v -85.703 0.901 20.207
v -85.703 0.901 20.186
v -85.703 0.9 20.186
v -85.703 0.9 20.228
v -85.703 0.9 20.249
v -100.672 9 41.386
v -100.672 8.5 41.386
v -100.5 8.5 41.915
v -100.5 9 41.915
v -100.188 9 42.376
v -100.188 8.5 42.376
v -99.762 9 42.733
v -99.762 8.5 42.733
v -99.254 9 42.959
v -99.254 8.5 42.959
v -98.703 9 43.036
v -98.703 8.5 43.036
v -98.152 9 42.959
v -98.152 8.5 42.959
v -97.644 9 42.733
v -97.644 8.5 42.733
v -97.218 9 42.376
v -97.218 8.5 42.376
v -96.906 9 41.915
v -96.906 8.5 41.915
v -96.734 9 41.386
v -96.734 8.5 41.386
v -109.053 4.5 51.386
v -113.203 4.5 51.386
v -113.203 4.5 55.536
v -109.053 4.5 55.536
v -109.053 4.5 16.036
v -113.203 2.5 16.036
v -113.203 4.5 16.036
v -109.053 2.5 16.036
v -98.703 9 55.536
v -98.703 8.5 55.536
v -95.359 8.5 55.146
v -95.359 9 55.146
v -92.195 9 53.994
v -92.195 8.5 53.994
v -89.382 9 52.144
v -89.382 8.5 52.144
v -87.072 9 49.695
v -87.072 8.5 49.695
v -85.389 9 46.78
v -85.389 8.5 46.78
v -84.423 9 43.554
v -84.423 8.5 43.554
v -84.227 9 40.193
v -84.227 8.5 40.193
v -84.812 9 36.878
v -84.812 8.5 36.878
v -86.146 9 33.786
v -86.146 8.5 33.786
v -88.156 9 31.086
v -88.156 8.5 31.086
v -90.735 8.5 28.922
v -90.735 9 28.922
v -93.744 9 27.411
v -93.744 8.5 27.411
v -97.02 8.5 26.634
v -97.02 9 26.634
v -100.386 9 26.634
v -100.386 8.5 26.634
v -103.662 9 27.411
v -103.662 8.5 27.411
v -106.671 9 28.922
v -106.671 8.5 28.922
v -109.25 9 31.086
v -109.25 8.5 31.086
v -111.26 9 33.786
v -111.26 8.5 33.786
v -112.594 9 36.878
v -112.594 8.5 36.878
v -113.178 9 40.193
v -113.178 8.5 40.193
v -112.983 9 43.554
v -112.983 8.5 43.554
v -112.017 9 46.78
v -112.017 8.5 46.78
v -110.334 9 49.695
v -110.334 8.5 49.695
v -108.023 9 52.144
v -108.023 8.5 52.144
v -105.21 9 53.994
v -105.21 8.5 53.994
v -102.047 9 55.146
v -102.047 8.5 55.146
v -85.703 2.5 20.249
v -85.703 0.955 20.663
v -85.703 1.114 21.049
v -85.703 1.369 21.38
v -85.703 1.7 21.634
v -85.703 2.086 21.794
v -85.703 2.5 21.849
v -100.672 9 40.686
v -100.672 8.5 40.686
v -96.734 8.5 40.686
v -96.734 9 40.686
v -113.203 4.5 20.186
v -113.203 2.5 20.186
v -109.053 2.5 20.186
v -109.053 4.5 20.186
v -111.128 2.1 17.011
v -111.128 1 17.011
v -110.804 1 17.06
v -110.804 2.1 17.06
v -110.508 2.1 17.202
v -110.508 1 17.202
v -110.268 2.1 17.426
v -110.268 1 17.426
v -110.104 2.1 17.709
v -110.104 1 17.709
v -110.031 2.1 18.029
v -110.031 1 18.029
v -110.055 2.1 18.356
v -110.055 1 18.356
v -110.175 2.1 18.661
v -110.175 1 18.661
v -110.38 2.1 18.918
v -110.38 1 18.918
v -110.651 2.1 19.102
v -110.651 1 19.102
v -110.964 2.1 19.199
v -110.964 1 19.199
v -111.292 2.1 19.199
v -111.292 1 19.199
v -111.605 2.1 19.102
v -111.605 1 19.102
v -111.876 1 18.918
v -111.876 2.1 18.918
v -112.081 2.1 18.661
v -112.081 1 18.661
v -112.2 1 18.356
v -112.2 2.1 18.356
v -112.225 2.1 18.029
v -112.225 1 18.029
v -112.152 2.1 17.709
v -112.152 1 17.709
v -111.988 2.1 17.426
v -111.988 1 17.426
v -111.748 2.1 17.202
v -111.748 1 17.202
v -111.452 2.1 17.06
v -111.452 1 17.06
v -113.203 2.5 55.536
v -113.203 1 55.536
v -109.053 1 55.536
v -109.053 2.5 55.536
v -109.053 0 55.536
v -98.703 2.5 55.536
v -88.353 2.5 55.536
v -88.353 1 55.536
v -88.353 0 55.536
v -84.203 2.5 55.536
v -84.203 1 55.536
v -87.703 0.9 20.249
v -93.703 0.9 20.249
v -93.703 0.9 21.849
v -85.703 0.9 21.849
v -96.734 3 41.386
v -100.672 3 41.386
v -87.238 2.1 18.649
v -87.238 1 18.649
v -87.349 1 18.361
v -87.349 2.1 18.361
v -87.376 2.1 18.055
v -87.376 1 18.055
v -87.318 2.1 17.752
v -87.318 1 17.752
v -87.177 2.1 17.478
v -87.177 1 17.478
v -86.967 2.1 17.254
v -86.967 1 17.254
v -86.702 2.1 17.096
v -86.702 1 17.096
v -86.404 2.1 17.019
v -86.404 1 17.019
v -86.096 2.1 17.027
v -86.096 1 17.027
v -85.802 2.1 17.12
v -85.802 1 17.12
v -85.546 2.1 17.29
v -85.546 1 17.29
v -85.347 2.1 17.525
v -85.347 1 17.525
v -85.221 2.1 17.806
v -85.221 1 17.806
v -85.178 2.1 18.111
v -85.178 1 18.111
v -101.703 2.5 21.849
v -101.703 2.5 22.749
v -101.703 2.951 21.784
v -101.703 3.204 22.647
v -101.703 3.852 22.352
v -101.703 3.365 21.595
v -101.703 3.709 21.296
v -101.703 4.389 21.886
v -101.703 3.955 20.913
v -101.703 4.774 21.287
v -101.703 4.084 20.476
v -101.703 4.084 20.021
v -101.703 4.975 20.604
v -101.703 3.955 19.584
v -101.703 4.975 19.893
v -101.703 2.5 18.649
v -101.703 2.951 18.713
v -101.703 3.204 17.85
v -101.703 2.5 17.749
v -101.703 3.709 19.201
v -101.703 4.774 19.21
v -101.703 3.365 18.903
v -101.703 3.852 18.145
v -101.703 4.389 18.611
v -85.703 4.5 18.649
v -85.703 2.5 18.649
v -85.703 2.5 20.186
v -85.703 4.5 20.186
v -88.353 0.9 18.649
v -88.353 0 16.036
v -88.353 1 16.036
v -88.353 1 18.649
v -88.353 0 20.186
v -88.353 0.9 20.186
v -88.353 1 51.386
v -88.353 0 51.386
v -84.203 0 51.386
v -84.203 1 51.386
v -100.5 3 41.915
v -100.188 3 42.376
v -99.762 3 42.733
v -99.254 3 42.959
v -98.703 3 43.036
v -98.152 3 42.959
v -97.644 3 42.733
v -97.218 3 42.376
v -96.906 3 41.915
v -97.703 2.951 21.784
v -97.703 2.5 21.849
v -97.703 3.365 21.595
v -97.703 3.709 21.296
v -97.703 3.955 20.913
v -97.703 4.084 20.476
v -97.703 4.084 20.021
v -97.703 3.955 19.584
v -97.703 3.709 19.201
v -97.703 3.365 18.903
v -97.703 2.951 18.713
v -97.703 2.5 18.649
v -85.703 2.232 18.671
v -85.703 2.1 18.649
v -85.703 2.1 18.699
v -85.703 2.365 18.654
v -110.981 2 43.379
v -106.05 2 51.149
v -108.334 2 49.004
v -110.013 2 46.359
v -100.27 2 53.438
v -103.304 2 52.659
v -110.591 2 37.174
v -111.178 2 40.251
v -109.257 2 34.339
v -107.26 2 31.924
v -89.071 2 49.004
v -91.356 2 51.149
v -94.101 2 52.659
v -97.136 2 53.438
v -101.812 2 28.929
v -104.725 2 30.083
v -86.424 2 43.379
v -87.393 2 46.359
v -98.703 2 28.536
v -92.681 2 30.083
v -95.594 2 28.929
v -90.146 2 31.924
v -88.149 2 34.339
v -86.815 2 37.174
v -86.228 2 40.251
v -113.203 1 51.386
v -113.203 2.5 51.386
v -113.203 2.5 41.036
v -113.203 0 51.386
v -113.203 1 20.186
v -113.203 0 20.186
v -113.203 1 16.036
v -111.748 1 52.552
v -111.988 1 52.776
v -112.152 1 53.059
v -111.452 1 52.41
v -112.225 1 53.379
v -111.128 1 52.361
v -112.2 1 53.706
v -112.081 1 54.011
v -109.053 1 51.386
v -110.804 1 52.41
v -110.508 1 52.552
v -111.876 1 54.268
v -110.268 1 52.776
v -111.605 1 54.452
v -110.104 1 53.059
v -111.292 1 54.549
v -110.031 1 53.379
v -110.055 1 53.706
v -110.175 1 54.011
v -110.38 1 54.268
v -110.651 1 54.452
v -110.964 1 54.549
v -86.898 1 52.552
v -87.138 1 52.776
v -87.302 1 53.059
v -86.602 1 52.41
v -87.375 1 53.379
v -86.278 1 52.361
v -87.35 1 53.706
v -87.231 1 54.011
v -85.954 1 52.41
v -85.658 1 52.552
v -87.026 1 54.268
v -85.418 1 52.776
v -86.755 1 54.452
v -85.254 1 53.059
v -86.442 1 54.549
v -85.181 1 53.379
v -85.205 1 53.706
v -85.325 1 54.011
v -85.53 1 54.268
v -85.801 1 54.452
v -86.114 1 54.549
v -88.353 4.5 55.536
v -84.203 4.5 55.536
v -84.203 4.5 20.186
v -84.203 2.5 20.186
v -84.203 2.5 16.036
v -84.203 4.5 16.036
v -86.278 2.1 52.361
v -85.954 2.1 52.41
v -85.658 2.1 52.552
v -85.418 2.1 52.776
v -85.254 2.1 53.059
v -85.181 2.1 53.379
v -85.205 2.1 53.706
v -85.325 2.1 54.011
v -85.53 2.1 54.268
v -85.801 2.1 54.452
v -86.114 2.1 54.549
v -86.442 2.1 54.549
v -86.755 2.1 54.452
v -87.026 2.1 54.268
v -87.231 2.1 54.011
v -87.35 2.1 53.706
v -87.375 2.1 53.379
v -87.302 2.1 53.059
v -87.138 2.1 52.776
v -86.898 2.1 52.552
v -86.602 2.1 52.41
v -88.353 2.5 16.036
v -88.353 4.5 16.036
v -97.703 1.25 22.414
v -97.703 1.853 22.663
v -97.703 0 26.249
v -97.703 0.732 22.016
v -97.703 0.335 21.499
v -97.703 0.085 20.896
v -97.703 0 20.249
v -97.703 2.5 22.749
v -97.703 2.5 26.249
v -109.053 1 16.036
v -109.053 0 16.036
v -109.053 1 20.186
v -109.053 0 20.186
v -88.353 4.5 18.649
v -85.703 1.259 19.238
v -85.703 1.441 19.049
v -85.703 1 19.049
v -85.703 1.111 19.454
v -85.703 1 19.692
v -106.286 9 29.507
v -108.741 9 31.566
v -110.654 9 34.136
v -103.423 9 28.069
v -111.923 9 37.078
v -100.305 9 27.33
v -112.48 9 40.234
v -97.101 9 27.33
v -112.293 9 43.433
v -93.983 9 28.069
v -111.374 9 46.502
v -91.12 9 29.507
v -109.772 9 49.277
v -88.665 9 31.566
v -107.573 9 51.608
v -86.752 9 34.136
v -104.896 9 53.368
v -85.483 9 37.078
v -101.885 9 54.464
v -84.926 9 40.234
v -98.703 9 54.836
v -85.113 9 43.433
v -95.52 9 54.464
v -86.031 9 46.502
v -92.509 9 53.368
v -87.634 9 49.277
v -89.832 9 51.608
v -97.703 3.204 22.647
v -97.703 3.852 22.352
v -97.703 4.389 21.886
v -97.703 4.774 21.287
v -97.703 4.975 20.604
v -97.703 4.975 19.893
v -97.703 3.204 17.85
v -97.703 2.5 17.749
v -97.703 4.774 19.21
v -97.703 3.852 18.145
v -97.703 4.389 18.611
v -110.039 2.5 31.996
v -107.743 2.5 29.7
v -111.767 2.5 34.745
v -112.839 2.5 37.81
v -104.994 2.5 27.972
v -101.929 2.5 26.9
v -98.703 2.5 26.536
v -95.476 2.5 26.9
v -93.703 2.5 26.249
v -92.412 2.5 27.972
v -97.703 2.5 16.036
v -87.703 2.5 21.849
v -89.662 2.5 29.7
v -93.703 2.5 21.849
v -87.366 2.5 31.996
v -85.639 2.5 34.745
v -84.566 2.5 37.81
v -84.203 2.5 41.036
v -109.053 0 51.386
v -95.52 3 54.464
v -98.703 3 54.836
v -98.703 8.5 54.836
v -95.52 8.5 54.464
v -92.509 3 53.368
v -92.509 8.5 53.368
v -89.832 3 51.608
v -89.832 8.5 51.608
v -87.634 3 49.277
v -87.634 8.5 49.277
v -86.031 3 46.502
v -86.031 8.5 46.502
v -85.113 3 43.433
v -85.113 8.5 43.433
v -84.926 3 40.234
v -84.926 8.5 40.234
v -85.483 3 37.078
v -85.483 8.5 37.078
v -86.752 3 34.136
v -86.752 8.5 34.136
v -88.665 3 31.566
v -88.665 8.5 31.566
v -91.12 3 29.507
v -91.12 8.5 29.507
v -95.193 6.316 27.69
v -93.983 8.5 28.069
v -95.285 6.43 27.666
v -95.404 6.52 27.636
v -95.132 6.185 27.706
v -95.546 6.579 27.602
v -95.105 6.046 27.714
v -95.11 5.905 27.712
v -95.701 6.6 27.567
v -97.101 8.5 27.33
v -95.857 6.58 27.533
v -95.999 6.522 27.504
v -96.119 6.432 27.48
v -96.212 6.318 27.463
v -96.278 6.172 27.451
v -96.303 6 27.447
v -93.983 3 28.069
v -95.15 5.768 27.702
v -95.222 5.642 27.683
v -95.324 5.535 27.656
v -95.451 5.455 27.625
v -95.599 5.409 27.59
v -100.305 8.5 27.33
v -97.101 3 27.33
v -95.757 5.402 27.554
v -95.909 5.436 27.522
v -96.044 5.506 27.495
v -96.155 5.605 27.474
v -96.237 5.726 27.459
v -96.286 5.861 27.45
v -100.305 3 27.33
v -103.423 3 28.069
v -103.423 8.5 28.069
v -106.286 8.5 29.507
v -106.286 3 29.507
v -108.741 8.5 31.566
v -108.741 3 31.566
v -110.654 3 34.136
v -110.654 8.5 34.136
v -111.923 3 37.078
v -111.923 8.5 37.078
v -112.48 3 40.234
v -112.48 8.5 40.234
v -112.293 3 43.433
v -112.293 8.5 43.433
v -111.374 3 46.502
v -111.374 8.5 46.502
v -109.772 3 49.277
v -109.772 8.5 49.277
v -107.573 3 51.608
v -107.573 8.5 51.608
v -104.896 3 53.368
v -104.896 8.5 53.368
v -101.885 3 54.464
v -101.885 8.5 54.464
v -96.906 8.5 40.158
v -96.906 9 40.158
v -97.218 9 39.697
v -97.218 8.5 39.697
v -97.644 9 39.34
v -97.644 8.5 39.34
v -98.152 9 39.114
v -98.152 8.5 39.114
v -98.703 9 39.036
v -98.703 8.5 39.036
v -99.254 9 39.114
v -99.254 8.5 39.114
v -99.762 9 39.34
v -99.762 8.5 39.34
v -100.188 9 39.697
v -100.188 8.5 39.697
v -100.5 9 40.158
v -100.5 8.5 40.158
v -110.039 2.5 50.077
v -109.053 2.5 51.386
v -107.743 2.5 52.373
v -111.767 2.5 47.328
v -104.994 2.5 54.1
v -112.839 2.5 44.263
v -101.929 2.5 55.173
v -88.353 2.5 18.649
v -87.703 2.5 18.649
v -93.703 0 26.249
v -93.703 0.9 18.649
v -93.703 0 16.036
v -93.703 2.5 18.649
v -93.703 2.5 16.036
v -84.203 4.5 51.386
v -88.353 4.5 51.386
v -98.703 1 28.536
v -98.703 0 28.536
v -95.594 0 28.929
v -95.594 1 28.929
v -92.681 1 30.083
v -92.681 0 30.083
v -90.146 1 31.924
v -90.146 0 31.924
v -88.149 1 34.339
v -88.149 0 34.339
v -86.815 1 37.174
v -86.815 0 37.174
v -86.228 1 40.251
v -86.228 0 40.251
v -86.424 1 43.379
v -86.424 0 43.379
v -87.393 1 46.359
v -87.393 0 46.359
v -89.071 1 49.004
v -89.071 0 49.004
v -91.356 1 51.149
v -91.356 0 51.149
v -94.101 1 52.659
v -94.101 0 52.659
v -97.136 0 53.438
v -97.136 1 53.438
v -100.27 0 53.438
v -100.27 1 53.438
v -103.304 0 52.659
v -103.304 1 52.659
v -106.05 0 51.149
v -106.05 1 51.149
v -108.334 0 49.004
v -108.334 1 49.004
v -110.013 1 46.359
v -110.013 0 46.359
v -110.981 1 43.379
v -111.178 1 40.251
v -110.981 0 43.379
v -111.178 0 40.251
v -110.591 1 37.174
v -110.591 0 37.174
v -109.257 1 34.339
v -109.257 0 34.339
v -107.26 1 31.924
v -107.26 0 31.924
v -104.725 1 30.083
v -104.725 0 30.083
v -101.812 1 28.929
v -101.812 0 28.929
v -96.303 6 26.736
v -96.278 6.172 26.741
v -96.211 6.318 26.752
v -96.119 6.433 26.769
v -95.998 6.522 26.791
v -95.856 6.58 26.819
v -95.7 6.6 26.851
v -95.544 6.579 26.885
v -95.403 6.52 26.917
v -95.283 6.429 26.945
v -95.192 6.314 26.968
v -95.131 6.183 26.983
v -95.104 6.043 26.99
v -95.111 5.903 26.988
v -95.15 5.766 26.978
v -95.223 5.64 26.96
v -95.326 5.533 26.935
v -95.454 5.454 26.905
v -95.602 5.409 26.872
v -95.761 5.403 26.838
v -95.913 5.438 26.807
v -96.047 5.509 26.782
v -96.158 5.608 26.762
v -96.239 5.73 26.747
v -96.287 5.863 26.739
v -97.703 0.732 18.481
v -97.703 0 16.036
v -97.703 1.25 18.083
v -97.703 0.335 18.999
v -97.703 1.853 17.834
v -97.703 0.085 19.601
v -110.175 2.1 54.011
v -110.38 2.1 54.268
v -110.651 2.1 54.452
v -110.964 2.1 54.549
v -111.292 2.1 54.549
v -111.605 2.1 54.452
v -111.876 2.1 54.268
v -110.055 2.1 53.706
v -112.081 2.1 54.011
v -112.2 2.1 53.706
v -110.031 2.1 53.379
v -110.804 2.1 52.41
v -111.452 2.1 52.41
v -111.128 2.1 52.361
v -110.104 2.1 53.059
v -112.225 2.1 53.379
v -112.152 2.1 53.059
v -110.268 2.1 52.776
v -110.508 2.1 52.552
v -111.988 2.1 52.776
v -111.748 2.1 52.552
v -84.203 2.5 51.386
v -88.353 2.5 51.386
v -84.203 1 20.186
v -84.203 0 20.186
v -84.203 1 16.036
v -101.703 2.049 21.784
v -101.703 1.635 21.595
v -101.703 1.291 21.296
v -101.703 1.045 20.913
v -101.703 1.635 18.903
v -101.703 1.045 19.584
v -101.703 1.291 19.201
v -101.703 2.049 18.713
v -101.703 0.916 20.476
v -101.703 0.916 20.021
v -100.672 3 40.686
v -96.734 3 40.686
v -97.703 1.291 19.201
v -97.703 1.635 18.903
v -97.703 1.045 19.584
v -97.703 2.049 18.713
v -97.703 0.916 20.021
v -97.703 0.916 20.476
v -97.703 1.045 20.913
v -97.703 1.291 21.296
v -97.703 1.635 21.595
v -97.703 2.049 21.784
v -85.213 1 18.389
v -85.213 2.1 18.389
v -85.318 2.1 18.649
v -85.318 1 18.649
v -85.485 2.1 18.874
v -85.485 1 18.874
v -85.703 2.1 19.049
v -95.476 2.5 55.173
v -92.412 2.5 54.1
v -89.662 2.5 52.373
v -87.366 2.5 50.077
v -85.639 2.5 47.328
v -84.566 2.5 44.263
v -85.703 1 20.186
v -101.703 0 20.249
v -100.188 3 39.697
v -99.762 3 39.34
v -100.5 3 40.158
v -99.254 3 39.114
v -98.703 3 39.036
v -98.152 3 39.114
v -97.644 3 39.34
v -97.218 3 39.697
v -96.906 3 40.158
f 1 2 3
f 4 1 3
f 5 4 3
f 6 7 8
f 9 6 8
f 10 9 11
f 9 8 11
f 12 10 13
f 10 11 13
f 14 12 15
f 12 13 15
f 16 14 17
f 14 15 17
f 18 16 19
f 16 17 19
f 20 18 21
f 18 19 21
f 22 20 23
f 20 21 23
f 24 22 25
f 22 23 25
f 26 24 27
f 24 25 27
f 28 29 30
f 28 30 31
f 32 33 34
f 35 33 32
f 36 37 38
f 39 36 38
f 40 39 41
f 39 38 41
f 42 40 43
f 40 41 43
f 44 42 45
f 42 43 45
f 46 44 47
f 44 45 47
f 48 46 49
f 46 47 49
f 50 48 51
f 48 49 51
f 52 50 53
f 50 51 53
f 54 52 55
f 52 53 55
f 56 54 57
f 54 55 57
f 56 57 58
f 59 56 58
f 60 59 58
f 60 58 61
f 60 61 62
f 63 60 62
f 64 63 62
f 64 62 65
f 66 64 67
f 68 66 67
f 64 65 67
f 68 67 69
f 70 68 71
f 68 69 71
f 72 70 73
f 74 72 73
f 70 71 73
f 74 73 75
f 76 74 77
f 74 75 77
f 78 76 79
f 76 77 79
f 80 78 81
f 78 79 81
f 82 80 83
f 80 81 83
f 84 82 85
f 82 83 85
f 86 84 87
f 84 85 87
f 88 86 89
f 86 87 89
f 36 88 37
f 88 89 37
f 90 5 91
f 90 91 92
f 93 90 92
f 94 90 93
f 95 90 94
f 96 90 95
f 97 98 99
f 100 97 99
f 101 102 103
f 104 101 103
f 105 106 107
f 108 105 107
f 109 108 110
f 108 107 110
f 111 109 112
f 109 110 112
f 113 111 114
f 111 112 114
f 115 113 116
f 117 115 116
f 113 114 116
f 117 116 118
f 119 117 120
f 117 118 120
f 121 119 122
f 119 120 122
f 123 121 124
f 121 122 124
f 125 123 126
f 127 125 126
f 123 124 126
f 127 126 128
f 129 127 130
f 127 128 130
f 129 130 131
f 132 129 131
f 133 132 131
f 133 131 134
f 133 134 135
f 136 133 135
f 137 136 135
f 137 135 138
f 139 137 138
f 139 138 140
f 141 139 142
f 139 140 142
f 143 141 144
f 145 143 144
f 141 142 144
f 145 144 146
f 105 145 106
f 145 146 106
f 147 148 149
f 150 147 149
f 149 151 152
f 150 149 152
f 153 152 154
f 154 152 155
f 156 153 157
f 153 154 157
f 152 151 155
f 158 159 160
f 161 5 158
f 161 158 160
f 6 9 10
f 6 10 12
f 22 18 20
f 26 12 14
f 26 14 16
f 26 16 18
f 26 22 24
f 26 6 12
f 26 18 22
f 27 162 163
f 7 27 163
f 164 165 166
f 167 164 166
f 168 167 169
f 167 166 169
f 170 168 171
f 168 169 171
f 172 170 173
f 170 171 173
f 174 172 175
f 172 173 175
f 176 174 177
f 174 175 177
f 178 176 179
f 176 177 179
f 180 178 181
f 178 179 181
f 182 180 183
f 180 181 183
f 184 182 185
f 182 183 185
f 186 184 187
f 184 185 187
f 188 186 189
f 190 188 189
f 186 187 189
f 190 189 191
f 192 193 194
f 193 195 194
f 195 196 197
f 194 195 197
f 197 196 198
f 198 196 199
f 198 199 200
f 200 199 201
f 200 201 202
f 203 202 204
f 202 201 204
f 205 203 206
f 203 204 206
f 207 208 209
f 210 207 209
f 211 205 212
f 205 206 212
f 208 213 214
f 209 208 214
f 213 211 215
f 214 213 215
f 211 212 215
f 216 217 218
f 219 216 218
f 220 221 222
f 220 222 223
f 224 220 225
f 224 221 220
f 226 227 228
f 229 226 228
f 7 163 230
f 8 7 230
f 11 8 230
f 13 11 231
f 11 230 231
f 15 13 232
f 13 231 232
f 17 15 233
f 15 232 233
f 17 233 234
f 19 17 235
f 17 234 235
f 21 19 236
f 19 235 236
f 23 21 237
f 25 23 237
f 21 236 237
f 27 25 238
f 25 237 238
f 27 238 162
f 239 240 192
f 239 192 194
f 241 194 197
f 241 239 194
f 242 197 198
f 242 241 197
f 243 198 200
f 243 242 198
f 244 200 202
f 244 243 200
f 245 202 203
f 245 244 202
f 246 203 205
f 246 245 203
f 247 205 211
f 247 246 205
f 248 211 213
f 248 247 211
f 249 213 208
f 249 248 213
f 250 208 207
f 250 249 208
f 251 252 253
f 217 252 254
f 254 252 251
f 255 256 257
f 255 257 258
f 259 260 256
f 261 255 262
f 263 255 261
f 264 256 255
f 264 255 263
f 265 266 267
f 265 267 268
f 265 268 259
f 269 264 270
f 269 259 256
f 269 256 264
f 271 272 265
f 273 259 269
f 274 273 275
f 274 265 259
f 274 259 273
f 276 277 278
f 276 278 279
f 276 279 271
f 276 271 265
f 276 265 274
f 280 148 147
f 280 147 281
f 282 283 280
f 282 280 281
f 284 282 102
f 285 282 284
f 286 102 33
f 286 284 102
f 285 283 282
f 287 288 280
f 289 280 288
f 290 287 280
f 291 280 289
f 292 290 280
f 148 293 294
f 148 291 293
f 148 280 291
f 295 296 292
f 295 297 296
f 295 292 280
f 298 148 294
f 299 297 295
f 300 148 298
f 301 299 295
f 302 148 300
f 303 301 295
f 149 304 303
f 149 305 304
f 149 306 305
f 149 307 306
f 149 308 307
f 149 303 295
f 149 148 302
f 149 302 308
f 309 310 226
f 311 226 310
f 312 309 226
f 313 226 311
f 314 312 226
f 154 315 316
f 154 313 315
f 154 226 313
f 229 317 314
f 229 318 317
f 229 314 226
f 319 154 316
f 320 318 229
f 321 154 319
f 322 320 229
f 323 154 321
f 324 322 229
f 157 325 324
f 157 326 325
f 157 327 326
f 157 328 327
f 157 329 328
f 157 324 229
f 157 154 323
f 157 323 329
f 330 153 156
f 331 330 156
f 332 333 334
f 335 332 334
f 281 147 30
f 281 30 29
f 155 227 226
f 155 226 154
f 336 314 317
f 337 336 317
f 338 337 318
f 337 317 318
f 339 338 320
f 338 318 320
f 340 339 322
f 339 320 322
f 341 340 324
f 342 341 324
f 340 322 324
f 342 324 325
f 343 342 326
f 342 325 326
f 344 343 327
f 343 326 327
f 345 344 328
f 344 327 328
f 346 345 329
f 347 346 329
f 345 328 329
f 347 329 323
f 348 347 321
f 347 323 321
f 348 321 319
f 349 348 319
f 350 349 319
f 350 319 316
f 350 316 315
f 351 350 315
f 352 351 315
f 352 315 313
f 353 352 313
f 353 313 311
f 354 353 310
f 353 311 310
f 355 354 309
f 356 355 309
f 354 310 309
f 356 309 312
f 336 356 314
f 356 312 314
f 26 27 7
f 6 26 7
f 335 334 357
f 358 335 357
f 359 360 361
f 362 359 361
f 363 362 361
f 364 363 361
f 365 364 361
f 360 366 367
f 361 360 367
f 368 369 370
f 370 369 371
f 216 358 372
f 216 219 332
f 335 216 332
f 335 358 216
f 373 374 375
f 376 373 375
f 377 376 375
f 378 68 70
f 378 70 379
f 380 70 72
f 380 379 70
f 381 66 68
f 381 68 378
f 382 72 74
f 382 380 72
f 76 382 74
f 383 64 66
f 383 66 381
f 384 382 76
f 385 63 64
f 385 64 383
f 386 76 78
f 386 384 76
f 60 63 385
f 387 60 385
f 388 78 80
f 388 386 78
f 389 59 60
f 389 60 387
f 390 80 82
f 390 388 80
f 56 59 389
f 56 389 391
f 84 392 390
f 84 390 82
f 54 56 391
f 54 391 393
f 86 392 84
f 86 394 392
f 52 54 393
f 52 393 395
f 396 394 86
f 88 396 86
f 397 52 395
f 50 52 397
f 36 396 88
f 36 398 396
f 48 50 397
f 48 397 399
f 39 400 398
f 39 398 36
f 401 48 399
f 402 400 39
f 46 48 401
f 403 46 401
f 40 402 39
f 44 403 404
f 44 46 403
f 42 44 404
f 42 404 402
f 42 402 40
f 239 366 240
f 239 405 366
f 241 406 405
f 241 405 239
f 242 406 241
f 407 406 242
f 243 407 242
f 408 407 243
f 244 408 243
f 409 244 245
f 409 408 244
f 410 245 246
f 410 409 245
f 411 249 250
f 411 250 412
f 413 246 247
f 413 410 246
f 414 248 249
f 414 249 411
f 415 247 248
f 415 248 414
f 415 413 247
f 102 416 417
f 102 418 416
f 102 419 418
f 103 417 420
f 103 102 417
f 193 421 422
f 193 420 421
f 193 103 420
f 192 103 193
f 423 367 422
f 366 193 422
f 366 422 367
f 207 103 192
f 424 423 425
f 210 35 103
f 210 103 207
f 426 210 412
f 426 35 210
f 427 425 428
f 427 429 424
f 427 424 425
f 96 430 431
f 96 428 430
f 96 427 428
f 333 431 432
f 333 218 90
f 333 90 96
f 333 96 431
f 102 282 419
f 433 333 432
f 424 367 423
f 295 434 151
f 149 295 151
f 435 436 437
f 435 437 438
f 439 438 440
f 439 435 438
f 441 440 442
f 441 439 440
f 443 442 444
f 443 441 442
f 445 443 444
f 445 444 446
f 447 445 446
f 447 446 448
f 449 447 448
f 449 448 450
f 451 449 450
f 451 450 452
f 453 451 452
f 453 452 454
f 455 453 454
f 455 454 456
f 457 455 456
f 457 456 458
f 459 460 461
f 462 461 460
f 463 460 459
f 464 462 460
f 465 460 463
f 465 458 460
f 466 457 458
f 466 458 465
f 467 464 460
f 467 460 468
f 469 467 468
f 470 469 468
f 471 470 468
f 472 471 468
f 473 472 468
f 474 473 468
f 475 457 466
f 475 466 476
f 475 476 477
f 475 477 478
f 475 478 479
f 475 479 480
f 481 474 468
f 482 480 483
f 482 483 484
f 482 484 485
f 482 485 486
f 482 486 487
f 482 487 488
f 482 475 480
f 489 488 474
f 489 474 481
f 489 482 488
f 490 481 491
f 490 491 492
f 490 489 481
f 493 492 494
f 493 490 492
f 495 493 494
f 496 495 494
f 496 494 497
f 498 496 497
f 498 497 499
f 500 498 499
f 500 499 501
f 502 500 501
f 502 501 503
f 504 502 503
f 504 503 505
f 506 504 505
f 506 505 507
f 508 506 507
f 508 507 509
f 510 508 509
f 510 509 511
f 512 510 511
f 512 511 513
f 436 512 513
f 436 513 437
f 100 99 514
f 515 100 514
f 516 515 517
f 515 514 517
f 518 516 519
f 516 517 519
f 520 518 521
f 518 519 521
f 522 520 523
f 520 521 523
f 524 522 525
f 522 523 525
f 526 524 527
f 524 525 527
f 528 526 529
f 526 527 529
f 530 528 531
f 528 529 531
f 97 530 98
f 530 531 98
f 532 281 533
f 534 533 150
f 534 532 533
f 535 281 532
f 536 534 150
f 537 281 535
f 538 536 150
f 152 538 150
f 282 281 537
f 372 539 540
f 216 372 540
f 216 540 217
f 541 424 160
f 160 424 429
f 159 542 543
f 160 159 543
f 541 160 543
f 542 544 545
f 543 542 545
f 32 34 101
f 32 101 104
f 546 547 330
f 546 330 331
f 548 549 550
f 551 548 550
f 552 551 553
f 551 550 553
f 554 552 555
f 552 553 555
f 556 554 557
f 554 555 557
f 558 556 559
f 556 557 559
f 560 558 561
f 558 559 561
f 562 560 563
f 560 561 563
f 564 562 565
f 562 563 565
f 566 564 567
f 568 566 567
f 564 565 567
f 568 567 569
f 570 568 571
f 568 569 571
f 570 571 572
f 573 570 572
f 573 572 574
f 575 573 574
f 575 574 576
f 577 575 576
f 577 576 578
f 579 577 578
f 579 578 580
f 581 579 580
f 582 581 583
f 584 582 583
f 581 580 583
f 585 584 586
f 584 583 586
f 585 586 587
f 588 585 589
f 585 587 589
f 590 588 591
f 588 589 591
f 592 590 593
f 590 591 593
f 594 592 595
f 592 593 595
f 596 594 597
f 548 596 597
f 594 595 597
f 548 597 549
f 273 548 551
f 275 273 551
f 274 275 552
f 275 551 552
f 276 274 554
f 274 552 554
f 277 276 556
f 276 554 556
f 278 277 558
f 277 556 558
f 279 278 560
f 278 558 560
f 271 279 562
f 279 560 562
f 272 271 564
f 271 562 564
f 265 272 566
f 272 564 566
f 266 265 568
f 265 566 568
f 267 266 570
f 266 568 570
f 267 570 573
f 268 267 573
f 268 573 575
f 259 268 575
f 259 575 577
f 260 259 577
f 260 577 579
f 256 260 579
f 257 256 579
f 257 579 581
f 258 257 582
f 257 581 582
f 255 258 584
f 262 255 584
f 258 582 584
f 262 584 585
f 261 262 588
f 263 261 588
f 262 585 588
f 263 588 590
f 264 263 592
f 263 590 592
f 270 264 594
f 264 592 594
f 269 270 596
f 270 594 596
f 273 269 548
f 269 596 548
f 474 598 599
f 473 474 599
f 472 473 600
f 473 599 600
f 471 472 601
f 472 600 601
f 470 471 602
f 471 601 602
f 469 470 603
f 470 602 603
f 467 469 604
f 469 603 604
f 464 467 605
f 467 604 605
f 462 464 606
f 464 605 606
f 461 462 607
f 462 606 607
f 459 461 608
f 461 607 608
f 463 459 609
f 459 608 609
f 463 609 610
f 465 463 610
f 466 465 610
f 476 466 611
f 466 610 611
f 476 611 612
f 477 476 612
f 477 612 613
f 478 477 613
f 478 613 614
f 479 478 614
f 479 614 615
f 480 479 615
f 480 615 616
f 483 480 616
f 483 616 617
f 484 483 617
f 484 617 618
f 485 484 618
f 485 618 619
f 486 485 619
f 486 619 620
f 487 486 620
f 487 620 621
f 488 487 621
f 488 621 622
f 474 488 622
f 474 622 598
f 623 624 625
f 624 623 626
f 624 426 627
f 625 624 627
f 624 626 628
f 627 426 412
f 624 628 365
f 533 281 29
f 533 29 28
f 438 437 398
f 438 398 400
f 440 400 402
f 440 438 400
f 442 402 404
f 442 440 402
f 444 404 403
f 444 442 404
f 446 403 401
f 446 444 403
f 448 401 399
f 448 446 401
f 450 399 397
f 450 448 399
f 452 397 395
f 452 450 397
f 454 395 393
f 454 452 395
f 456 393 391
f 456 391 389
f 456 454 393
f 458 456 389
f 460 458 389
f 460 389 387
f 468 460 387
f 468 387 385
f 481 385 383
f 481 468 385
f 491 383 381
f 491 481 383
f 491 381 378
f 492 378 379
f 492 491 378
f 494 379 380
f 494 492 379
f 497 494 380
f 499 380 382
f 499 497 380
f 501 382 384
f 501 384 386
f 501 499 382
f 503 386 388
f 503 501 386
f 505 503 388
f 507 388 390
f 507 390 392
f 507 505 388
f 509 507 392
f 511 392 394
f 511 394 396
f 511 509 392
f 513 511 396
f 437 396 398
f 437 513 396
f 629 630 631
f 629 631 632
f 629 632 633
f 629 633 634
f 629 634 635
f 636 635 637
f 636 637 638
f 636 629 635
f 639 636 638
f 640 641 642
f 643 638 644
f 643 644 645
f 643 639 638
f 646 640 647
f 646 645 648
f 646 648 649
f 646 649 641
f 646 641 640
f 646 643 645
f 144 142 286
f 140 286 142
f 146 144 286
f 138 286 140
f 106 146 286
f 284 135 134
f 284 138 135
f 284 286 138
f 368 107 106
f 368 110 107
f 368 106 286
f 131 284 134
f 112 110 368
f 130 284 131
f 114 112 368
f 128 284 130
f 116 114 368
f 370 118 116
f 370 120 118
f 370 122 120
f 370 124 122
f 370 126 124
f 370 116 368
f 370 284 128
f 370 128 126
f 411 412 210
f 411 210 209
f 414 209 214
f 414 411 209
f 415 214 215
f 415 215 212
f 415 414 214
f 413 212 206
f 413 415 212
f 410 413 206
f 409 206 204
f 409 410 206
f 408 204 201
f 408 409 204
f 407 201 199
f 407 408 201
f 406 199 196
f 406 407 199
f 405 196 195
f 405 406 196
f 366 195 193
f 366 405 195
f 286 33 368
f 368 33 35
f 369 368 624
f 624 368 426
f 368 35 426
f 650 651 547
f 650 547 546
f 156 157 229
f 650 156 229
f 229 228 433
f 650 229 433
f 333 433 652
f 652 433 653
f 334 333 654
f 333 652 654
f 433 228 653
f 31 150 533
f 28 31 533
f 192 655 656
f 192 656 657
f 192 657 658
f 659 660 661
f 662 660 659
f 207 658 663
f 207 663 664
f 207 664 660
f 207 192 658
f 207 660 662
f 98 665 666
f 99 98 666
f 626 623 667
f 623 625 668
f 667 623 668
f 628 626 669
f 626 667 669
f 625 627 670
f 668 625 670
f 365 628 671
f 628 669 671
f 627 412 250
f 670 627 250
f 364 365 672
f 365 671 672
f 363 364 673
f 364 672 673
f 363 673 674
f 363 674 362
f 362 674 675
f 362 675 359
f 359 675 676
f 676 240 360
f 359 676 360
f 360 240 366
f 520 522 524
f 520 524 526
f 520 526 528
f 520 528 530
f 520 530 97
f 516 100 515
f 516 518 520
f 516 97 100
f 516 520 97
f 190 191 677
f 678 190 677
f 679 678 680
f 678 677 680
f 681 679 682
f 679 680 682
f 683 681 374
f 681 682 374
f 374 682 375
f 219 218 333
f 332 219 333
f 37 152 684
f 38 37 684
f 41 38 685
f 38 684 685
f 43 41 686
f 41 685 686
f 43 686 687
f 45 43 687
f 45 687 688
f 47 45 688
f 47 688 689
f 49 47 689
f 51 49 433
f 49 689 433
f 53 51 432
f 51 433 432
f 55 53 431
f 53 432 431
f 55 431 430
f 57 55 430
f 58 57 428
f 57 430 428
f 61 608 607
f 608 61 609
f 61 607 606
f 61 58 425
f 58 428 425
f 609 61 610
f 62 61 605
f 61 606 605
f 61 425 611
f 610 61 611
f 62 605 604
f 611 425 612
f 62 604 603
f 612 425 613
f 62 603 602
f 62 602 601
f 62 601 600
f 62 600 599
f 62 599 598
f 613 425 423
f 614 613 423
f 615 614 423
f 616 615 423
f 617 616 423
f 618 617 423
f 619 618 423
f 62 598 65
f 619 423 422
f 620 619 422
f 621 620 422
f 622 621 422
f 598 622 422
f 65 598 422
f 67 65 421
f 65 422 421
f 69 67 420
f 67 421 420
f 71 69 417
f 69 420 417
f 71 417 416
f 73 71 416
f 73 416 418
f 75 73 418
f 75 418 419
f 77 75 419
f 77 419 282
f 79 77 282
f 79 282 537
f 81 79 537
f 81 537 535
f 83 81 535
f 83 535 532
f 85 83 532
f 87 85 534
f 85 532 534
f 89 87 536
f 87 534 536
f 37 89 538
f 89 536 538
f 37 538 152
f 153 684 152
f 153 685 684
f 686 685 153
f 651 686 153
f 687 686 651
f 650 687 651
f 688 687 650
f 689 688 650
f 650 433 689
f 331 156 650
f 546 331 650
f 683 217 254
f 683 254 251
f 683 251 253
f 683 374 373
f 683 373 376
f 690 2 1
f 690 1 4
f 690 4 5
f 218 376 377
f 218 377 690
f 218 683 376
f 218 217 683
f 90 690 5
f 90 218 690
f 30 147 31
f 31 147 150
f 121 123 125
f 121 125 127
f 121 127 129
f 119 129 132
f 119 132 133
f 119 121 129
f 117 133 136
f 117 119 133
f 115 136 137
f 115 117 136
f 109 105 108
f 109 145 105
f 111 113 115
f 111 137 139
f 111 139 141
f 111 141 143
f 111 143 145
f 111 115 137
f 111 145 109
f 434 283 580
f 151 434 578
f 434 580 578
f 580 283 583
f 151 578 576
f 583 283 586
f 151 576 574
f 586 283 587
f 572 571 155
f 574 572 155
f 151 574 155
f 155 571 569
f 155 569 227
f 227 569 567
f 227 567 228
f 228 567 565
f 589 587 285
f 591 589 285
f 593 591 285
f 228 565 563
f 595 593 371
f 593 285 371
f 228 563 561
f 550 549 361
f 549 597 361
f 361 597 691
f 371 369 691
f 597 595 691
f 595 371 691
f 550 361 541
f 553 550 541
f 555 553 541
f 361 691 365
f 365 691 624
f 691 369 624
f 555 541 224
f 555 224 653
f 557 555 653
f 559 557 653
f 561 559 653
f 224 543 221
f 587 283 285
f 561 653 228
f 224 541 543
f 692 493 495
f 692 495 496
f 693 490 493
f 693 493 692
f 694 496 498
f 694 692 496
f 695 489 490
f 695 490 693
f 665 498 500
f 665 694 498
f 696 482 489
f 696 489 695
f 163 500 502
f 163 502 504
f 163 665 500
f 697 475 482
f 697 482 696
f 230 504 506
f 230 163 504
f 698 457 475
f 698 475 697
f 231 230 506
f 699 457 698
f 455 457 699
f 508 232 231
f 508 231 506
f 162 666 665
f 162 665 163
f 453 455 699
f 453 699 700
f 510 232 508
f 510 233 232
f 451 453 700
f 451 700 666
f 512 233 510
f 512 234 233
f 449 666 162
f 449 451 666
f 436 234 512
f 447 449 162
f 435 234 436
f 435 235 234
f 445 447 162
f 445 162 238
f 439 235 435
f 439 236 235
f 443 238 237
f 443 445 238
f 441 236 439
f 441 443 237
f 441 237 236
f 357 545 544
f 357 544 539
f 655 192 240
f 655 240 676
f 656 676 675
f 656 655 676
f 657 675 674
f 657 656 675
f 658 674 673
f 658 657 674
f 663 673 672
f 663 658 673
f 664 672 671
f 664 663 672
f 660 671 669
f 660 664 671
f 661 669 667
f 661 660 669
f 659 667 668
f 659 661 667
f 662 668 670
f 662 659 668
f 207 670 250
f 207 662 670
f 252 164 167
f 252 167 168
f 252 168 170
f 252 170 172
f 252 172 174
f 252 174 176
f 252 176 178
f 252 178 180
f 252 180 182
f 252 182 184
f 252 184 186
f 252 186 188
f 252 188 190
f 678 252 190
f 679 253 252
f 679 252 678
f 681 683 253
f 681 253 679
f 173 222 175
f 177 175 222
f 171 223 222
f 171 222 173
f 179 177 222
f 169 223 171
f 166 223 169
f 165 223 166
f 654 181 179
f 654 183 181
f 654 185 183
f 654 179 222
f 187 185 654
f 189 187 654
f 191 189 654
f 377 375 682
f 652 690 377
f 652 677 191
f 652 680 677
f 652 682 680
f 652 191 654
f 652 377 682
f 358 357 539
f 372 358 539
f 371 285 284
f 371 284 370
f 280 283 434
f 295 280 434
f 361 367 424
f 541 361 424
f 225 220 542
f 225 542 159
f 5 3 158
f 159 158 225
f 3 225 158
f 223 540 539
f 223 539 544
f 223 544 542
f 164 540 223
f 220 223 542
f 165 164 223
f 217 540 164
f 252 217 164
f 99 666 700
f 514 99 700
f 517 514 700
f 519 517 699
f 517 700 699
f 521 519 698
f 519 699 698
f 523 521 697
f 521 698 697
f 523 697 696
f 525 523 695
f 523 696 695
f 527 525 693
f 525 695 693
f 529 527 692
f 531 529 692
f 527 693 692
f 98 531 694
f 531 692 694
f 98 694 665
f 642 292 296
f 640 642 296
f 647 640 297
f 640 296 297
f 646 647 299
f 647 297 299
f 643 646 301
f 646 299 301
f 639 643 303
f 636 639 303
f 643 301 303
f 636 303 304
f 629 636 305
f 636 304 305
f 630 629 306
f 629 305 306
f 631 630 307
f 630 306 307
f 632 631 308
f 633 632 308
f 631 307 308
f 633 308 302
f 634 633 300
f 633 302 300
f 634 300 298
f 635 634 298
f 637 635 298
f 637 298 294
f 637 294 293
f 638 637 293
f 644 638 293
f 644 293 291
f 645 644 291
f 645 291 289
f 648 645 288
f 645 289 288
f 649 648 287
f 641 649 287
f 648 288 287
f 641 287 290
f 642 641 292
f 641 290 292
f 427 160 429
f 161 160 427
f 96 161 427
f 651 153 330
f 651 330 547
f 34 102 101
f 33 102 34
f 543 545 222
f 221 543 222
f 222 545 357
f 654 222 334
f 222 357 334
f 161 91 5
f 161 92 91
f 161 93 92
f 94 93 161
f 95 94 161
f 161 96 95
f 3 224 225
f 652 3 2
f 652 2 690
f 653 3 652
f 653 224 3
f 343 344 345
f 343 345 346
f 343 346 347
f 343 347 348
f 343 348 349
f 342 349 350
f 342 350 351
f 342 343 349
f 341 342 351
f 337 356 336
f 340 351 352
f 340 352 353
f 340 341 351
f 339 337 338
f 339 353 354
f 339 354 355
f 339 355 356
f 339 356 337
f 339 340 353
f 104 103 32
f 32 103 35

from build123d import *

# Parameters (mm, degrees)
SKETCH1_W               = 29
SKETCH1_H               = 50
BOSS_EXTRUDE1_DEPTH     = 2.5
BOSS_EXTRUDE3_DEPTH     = 6
BOSS_EXTRUDE4_DEPTH     = 6
CUT_EXTRUDE1_DEPTH      = 6
CUT_EXTRUDE2_DEPTH      = 6
CUT_EXTRUDE3_DEPTH      = 10
CUT_EXTRUDE3_DEPTH_BACK = 4
SKETCH6_R               = 1.6
SKETCH7_R               = 2.5
SKETCH7_R_2             = 1.6
BOSS_EXTRUDE6_DEPTH     = 4
SKETCH8_W               = 3.2
SKETCH8_H               = 1.6
CUT_EXTRUDE4_DEPTH      = 8
CUT_EXTRUDE5_DEPTH      = 5
SKETCH10_R              = 12.5
SKETCH10_W              = 4.15
SKETCH10_H              = 4.15
CUT_EXTRUDE7_DEPTH      = 1
SKETCH11_W              = 4.15
SKETCH11_H              = 4.15
BOSS_EXTRUDE7_DEPTH     = 2
SKETCH13_R              = 1.1
CUT_EXTRUDE8_DEPTH      = 1.1
SKETCH14_R              = 12.5
CUT_EXTRUDE9_DEPTH      = 1
SKETCH15_R              = 13.8
BOSS_EXTRUDE8_DEPTH     = 0.5
SKETCH16_R              = 14.5
SKETCH16_R_2            = 13.8
BOSS_EXTRUDE9_DEPTH     = 0.5


with BuildPart() as part:
    # Sketch1 → Boss-Extrude1 (new body)
    with BuildSketch(Plane(origin=(0, 0, 0), x_dir=(1, 0, 0), z_dir=(0, 1, 0))):
        with Locations((-98.70287726, -30.536357795)):
            Rectangle(SKETCH1_W, SKETCH1_H)
    extrude(amount=BOSS_EXTRUDE1_DEPTH)

    # Sketch2 → Boss-Extrude3 (add)
    with BuildSketch(Plane(origin=(0, 2.5, 0), x_dir=(1, 0, 0), z_dir=(0, 1, 0))):
        with BuildLine():
            ThreePointArc((-84.20287726, -41.036357795), (-108.955925587, -30.783309468), (-98.70287726, -55.536357795))
            ThreePointArc((-98.70287726, -55.536357795), (-88.449828932, -51.289406123), (-84.20287726, -41.036357795))
        make_face()
        with BuildLine():
            ThreePointArc((-84.90287726, -41.036357795), (-88.944803679, -50.794431376), (-98.70287726, -54.836357795))
            ThreePointArc((-98.70287726, -54.836357795), (-108.46095084, -31.278284215), (-84.90287726, -41.036357795))
        make_face(mode=Mode.SUBTRACT)
    extrude(amount=BOSS_EXTRUDE3_DEPTH)

    # Sketch3 → Boss-Extrude4 (add)
    with BuildSketch(Plane(origin=(0, 2.5, 0), x_dir=(1, 0, 0), z_dir=(0, 1, 0))):
        with BuildLine():
            Line((-100.672014126, -40.686357795), (-96.733740393, -40.686357795))
            ThreePointArc((-96.733740393, -40.686357795), (-98.70287726, -39.036357795), (-100.672014126, -40.686357795))
        make_face()
        with BuildLine():
            Line((-96.733740393, -41.386357795), (-100.672014126, -41.386357795))
            ThreePointArc((-100.672014126, -41.386357795), (-98.70287726, -43.036357795), (-96.733740393, -41.386357795))
        make_face()
    extrude(amount=BOSS_EXTRUDE4_DEPTH)

    # Sketch4 → Cut-Extrude1 (cut)
    with BuildSketch(Plane(origin=(0, 2.5, 0), x_dir=(1, 0, 0), z_dir=(0, 1, 0))):
        Polygon((-97.70287726, -14.248512358), (-97.70287726, -20.248512358), (-97.70287726, -26.248512358), (-93.70287726, -26.248512358), (-93.70287726, -14.248512358), align=None)
    extrude(amount=-CUT_EXTRUDE1_DEPTH, mode=Mode.SUBTRACT)

    # Sketch5 → Cut-Extrude2 (cut)
    with BuildSketch(Plane(origin=(0, 0, 26.248512358), x_dir=(-1, 0, 0), z_dir=(0, 0, -1))):
        with BuildLine():
            ThreePointArc((95.70287726, 5.4), (96.127141328, 5.575735931), (96.30287726, 6))
            ThreePointArc((96.30287726, 6), (95.278613191, 6.424264069), (95.70287726, 5.4))
        make_face()
    extrude(amount=-CUT_EXTRUDE2_DEPTH, mode=Mode.SUBTRACT)

    # Sketch6 → Cut-Extrude3 (cut, two sides: drawn at the far end of the back side and taken through both)
    with BuildSketch(Plane(origin=(-97.70287726, 0, 0), x_dir=(0, 0, -1), z_dir=(1, 0, 0)).offset(-CUT_EXTRUDE3_DEPTH_BACK)):
        with Locations((-20.248512358, 2.5)):
            Circle(SKETCH6_R)
    extrude(amount=CUT_EXTRUDE3_DEPTH + CUT_EXTRUDE3_DEPTH_BACK, mode=Mode.SUBTRACT)

    # Sketch7 → Boss-Extrude6 (add)
    with BuildSketch(Plane(origin=(-97.70287726, 0, 0), x_dir=(0, 0, -1), z_dir=(1, 0, 0))):
        with Locations((-20.248512358, 2.5)):
            Circle(SKETCH7_R)
        with Locations((-20.248512358, 2.5)):
            Circle(SKETCH7_R_2, mode=Mode.SUBTRACT)
    extrude(amount=-BOSS_EXTRUDE6_DEPTH)

    # Sketch8 → Cut-Extrude4 (cut)
    with BuildSketch(Plane.ZY.offset(93.70287726)):
        with Locations((20.248512358, 1.7)):
            Rectangle(SKETCH8_W, SKETCH8_H)
    extrude(amount=-CUT_EXTRUDE4_DEPTH, mode=Mode.SUBTRACT)

    # Sketch9 → Cut-Extrude5 (cut)
    with BuildSketch(Plane(origin=(0, 2.5, 0), x_dir=(1, 0, 0), z_dir=(0, 1, 0))):
        Polygon((-113.20287726, -5.536357795), (-113.20287726, -16.036357795), (-97.70287726, -16.036357795), (-97.70287726, -14.248512358), (-93.70287726, -14.248512358), (-93.70287726, -16.036357795), (-84.20287726, -16.036357795), (-84.20287726, -5.536357795), align=None)
    extrude(amount=-CUT_EXTRUDE5_DEPTH, mode=Mode.SUBTRACT)

    # Sketch10 → Cut-Extrude7 (cut)
    with BuildSketch(Plane.XZ):
        with Locations((-98.70287726, 41.036357795)):
            Circle(SKETCH10_R)
        with Locations((-86.27787726, 18.111357795)):
            Rectangle(SKETCH10_W, SKETCH10_H)
        with Locations((-86.27787726, 53.461357795)):
            Rectangle(SKETCH10_W, SKETCH10_H)
        with Locations((-111.12787726, 18.111357795)):
            Rectangle(SKETCH10_W, SKETCH10_H)
        with Locations((-111.12787726, 53.461357795)):
            Rectangle(SKETCH10_W, SKETCH10_H)
    extrude(amount=-CUT_EXTRUDE7_DEPTH, mode=Mode.SUBTRACT)

    # Sketch11 → Boss-Extrude7 (add)
    with BuildSketch(Plane(origin=(0, 2.5, 0), x_dir=(1, 0, 0), z_dir=(0, 1, 0))):
        Polygon((-88.35287726, -16.036357795), (-88.35287726, -18.648512358), (-85.70287726, -18.648512358), (-85.70287726, -20.186357795), (-84.20287726, -20.186357795), (-84.20287726, -16.036357795), align=None)
        with Locations((-111.12787726, -53.461357795)):
            Rectangle(SKETCH11_W, SKETCH11_H)
        with Locations((-86.27787726, -53.461357795)):
            Rectangle(SKETCH11_W, SKETCH11_H)
        with Locations((-111.12787726, -18.111357795)):
            Rectangle(SKETCH11_W, SKETCH11_H)
    extrude(amount=BOSS_EXTRUDE7_DEPTH)

    # Sketch13 → Cut-Extrude8 (cut)
    with BuildSketch(Plane.XZ.offset(-1)):
        with Locations((-111.12787726, 53.461357795)):
            Circle(SKETCH13_R)
        with Locations((-86.27787726, 53.461357795)):
            Circle(SKETCH13_R)
        with Locations((-111.12787726, 18.111357795)):
            Circle(SKETCH13_R)
        with Locations((-86.27787726, 18.111357795)):
            Circle(SKETCH13_R)
    extrude(amount=-CUT_EXTRUDE8_DEPTH, mode=Mode.SUBTRACT)

    # Sketch14 → Cut-Extrude9 (cut)
    with BuildSketch(Plane.XZ.offset(-1)):
        with Locations((-98.70287726, 41.036357795)):
            Circle(SKETCH14_R)
    extrude(amount=-CUT_EXTRUDE9_DEPTH, mode=Mode.SUBTRACT)

    # Sketch15 → Boss-Extrude8 (add)
    with BuildSketch(Plane(origin=(0, 2.5, 0), x_dir=(1, 0, 0), z_dir=(0, 1, 0))):
        with Locations((-98.70287726, -41.036357795)):
            Circle(SKETCH15_R)
    extrude(amount=BOSS_EXTRUDE8_DEPTH)

    # Sketch16 → Boss-Extrude9 (add)
    # profile 1 of 3: a face of its own
    with BuildSketch(Plane(origin=(0, 8.5, 0), x_dir=(1, 0, 0), z_dir=(0, 1, 0))):
        with Locations((-98.70287726, -41.036357795)):
            Circle(SKETCH16_R)
        with Locations((-98.70287726, -41.036357795)):
            Circle(SKETCH16_R_2, mode=Mode.SUBTRACT)
    # profile 2 of 3: a face of its own
    with BuildSketch(Plane(origin=(0, 8.5, 0), x_dir=(1, 0, 0), z_dir=(0, 1, 0))):
        with BuildLine():
            ThreePointArc((-96.733740393, -40.686357795), (-98.70287726, -39.036357795), (-100.672014126, -40.686357795))
            Line((-100.672014126, -40.686357795), (-96.733740393, -40.686357795))
        make_face()
    # profile 3 of 3: a face of its own
    with BuildSketch(Plane(origin=(0, 8.5, 0), x_dir=(1, 0, 0), z_dir=(0, 1, 0))):
        with BuildLine():
            ThreePointArc((-100.672014126, -41.386357795), (-98.70287726, -43.036357795), (-96.733740393, -41.386357795))
            Line((-96.733740393, -41.386357795), (-100.672014126, -41.386357795))
        make_face()
    extrude(amount=BOSS_EXTRUDE9_DEPTH)


solid = part.part
